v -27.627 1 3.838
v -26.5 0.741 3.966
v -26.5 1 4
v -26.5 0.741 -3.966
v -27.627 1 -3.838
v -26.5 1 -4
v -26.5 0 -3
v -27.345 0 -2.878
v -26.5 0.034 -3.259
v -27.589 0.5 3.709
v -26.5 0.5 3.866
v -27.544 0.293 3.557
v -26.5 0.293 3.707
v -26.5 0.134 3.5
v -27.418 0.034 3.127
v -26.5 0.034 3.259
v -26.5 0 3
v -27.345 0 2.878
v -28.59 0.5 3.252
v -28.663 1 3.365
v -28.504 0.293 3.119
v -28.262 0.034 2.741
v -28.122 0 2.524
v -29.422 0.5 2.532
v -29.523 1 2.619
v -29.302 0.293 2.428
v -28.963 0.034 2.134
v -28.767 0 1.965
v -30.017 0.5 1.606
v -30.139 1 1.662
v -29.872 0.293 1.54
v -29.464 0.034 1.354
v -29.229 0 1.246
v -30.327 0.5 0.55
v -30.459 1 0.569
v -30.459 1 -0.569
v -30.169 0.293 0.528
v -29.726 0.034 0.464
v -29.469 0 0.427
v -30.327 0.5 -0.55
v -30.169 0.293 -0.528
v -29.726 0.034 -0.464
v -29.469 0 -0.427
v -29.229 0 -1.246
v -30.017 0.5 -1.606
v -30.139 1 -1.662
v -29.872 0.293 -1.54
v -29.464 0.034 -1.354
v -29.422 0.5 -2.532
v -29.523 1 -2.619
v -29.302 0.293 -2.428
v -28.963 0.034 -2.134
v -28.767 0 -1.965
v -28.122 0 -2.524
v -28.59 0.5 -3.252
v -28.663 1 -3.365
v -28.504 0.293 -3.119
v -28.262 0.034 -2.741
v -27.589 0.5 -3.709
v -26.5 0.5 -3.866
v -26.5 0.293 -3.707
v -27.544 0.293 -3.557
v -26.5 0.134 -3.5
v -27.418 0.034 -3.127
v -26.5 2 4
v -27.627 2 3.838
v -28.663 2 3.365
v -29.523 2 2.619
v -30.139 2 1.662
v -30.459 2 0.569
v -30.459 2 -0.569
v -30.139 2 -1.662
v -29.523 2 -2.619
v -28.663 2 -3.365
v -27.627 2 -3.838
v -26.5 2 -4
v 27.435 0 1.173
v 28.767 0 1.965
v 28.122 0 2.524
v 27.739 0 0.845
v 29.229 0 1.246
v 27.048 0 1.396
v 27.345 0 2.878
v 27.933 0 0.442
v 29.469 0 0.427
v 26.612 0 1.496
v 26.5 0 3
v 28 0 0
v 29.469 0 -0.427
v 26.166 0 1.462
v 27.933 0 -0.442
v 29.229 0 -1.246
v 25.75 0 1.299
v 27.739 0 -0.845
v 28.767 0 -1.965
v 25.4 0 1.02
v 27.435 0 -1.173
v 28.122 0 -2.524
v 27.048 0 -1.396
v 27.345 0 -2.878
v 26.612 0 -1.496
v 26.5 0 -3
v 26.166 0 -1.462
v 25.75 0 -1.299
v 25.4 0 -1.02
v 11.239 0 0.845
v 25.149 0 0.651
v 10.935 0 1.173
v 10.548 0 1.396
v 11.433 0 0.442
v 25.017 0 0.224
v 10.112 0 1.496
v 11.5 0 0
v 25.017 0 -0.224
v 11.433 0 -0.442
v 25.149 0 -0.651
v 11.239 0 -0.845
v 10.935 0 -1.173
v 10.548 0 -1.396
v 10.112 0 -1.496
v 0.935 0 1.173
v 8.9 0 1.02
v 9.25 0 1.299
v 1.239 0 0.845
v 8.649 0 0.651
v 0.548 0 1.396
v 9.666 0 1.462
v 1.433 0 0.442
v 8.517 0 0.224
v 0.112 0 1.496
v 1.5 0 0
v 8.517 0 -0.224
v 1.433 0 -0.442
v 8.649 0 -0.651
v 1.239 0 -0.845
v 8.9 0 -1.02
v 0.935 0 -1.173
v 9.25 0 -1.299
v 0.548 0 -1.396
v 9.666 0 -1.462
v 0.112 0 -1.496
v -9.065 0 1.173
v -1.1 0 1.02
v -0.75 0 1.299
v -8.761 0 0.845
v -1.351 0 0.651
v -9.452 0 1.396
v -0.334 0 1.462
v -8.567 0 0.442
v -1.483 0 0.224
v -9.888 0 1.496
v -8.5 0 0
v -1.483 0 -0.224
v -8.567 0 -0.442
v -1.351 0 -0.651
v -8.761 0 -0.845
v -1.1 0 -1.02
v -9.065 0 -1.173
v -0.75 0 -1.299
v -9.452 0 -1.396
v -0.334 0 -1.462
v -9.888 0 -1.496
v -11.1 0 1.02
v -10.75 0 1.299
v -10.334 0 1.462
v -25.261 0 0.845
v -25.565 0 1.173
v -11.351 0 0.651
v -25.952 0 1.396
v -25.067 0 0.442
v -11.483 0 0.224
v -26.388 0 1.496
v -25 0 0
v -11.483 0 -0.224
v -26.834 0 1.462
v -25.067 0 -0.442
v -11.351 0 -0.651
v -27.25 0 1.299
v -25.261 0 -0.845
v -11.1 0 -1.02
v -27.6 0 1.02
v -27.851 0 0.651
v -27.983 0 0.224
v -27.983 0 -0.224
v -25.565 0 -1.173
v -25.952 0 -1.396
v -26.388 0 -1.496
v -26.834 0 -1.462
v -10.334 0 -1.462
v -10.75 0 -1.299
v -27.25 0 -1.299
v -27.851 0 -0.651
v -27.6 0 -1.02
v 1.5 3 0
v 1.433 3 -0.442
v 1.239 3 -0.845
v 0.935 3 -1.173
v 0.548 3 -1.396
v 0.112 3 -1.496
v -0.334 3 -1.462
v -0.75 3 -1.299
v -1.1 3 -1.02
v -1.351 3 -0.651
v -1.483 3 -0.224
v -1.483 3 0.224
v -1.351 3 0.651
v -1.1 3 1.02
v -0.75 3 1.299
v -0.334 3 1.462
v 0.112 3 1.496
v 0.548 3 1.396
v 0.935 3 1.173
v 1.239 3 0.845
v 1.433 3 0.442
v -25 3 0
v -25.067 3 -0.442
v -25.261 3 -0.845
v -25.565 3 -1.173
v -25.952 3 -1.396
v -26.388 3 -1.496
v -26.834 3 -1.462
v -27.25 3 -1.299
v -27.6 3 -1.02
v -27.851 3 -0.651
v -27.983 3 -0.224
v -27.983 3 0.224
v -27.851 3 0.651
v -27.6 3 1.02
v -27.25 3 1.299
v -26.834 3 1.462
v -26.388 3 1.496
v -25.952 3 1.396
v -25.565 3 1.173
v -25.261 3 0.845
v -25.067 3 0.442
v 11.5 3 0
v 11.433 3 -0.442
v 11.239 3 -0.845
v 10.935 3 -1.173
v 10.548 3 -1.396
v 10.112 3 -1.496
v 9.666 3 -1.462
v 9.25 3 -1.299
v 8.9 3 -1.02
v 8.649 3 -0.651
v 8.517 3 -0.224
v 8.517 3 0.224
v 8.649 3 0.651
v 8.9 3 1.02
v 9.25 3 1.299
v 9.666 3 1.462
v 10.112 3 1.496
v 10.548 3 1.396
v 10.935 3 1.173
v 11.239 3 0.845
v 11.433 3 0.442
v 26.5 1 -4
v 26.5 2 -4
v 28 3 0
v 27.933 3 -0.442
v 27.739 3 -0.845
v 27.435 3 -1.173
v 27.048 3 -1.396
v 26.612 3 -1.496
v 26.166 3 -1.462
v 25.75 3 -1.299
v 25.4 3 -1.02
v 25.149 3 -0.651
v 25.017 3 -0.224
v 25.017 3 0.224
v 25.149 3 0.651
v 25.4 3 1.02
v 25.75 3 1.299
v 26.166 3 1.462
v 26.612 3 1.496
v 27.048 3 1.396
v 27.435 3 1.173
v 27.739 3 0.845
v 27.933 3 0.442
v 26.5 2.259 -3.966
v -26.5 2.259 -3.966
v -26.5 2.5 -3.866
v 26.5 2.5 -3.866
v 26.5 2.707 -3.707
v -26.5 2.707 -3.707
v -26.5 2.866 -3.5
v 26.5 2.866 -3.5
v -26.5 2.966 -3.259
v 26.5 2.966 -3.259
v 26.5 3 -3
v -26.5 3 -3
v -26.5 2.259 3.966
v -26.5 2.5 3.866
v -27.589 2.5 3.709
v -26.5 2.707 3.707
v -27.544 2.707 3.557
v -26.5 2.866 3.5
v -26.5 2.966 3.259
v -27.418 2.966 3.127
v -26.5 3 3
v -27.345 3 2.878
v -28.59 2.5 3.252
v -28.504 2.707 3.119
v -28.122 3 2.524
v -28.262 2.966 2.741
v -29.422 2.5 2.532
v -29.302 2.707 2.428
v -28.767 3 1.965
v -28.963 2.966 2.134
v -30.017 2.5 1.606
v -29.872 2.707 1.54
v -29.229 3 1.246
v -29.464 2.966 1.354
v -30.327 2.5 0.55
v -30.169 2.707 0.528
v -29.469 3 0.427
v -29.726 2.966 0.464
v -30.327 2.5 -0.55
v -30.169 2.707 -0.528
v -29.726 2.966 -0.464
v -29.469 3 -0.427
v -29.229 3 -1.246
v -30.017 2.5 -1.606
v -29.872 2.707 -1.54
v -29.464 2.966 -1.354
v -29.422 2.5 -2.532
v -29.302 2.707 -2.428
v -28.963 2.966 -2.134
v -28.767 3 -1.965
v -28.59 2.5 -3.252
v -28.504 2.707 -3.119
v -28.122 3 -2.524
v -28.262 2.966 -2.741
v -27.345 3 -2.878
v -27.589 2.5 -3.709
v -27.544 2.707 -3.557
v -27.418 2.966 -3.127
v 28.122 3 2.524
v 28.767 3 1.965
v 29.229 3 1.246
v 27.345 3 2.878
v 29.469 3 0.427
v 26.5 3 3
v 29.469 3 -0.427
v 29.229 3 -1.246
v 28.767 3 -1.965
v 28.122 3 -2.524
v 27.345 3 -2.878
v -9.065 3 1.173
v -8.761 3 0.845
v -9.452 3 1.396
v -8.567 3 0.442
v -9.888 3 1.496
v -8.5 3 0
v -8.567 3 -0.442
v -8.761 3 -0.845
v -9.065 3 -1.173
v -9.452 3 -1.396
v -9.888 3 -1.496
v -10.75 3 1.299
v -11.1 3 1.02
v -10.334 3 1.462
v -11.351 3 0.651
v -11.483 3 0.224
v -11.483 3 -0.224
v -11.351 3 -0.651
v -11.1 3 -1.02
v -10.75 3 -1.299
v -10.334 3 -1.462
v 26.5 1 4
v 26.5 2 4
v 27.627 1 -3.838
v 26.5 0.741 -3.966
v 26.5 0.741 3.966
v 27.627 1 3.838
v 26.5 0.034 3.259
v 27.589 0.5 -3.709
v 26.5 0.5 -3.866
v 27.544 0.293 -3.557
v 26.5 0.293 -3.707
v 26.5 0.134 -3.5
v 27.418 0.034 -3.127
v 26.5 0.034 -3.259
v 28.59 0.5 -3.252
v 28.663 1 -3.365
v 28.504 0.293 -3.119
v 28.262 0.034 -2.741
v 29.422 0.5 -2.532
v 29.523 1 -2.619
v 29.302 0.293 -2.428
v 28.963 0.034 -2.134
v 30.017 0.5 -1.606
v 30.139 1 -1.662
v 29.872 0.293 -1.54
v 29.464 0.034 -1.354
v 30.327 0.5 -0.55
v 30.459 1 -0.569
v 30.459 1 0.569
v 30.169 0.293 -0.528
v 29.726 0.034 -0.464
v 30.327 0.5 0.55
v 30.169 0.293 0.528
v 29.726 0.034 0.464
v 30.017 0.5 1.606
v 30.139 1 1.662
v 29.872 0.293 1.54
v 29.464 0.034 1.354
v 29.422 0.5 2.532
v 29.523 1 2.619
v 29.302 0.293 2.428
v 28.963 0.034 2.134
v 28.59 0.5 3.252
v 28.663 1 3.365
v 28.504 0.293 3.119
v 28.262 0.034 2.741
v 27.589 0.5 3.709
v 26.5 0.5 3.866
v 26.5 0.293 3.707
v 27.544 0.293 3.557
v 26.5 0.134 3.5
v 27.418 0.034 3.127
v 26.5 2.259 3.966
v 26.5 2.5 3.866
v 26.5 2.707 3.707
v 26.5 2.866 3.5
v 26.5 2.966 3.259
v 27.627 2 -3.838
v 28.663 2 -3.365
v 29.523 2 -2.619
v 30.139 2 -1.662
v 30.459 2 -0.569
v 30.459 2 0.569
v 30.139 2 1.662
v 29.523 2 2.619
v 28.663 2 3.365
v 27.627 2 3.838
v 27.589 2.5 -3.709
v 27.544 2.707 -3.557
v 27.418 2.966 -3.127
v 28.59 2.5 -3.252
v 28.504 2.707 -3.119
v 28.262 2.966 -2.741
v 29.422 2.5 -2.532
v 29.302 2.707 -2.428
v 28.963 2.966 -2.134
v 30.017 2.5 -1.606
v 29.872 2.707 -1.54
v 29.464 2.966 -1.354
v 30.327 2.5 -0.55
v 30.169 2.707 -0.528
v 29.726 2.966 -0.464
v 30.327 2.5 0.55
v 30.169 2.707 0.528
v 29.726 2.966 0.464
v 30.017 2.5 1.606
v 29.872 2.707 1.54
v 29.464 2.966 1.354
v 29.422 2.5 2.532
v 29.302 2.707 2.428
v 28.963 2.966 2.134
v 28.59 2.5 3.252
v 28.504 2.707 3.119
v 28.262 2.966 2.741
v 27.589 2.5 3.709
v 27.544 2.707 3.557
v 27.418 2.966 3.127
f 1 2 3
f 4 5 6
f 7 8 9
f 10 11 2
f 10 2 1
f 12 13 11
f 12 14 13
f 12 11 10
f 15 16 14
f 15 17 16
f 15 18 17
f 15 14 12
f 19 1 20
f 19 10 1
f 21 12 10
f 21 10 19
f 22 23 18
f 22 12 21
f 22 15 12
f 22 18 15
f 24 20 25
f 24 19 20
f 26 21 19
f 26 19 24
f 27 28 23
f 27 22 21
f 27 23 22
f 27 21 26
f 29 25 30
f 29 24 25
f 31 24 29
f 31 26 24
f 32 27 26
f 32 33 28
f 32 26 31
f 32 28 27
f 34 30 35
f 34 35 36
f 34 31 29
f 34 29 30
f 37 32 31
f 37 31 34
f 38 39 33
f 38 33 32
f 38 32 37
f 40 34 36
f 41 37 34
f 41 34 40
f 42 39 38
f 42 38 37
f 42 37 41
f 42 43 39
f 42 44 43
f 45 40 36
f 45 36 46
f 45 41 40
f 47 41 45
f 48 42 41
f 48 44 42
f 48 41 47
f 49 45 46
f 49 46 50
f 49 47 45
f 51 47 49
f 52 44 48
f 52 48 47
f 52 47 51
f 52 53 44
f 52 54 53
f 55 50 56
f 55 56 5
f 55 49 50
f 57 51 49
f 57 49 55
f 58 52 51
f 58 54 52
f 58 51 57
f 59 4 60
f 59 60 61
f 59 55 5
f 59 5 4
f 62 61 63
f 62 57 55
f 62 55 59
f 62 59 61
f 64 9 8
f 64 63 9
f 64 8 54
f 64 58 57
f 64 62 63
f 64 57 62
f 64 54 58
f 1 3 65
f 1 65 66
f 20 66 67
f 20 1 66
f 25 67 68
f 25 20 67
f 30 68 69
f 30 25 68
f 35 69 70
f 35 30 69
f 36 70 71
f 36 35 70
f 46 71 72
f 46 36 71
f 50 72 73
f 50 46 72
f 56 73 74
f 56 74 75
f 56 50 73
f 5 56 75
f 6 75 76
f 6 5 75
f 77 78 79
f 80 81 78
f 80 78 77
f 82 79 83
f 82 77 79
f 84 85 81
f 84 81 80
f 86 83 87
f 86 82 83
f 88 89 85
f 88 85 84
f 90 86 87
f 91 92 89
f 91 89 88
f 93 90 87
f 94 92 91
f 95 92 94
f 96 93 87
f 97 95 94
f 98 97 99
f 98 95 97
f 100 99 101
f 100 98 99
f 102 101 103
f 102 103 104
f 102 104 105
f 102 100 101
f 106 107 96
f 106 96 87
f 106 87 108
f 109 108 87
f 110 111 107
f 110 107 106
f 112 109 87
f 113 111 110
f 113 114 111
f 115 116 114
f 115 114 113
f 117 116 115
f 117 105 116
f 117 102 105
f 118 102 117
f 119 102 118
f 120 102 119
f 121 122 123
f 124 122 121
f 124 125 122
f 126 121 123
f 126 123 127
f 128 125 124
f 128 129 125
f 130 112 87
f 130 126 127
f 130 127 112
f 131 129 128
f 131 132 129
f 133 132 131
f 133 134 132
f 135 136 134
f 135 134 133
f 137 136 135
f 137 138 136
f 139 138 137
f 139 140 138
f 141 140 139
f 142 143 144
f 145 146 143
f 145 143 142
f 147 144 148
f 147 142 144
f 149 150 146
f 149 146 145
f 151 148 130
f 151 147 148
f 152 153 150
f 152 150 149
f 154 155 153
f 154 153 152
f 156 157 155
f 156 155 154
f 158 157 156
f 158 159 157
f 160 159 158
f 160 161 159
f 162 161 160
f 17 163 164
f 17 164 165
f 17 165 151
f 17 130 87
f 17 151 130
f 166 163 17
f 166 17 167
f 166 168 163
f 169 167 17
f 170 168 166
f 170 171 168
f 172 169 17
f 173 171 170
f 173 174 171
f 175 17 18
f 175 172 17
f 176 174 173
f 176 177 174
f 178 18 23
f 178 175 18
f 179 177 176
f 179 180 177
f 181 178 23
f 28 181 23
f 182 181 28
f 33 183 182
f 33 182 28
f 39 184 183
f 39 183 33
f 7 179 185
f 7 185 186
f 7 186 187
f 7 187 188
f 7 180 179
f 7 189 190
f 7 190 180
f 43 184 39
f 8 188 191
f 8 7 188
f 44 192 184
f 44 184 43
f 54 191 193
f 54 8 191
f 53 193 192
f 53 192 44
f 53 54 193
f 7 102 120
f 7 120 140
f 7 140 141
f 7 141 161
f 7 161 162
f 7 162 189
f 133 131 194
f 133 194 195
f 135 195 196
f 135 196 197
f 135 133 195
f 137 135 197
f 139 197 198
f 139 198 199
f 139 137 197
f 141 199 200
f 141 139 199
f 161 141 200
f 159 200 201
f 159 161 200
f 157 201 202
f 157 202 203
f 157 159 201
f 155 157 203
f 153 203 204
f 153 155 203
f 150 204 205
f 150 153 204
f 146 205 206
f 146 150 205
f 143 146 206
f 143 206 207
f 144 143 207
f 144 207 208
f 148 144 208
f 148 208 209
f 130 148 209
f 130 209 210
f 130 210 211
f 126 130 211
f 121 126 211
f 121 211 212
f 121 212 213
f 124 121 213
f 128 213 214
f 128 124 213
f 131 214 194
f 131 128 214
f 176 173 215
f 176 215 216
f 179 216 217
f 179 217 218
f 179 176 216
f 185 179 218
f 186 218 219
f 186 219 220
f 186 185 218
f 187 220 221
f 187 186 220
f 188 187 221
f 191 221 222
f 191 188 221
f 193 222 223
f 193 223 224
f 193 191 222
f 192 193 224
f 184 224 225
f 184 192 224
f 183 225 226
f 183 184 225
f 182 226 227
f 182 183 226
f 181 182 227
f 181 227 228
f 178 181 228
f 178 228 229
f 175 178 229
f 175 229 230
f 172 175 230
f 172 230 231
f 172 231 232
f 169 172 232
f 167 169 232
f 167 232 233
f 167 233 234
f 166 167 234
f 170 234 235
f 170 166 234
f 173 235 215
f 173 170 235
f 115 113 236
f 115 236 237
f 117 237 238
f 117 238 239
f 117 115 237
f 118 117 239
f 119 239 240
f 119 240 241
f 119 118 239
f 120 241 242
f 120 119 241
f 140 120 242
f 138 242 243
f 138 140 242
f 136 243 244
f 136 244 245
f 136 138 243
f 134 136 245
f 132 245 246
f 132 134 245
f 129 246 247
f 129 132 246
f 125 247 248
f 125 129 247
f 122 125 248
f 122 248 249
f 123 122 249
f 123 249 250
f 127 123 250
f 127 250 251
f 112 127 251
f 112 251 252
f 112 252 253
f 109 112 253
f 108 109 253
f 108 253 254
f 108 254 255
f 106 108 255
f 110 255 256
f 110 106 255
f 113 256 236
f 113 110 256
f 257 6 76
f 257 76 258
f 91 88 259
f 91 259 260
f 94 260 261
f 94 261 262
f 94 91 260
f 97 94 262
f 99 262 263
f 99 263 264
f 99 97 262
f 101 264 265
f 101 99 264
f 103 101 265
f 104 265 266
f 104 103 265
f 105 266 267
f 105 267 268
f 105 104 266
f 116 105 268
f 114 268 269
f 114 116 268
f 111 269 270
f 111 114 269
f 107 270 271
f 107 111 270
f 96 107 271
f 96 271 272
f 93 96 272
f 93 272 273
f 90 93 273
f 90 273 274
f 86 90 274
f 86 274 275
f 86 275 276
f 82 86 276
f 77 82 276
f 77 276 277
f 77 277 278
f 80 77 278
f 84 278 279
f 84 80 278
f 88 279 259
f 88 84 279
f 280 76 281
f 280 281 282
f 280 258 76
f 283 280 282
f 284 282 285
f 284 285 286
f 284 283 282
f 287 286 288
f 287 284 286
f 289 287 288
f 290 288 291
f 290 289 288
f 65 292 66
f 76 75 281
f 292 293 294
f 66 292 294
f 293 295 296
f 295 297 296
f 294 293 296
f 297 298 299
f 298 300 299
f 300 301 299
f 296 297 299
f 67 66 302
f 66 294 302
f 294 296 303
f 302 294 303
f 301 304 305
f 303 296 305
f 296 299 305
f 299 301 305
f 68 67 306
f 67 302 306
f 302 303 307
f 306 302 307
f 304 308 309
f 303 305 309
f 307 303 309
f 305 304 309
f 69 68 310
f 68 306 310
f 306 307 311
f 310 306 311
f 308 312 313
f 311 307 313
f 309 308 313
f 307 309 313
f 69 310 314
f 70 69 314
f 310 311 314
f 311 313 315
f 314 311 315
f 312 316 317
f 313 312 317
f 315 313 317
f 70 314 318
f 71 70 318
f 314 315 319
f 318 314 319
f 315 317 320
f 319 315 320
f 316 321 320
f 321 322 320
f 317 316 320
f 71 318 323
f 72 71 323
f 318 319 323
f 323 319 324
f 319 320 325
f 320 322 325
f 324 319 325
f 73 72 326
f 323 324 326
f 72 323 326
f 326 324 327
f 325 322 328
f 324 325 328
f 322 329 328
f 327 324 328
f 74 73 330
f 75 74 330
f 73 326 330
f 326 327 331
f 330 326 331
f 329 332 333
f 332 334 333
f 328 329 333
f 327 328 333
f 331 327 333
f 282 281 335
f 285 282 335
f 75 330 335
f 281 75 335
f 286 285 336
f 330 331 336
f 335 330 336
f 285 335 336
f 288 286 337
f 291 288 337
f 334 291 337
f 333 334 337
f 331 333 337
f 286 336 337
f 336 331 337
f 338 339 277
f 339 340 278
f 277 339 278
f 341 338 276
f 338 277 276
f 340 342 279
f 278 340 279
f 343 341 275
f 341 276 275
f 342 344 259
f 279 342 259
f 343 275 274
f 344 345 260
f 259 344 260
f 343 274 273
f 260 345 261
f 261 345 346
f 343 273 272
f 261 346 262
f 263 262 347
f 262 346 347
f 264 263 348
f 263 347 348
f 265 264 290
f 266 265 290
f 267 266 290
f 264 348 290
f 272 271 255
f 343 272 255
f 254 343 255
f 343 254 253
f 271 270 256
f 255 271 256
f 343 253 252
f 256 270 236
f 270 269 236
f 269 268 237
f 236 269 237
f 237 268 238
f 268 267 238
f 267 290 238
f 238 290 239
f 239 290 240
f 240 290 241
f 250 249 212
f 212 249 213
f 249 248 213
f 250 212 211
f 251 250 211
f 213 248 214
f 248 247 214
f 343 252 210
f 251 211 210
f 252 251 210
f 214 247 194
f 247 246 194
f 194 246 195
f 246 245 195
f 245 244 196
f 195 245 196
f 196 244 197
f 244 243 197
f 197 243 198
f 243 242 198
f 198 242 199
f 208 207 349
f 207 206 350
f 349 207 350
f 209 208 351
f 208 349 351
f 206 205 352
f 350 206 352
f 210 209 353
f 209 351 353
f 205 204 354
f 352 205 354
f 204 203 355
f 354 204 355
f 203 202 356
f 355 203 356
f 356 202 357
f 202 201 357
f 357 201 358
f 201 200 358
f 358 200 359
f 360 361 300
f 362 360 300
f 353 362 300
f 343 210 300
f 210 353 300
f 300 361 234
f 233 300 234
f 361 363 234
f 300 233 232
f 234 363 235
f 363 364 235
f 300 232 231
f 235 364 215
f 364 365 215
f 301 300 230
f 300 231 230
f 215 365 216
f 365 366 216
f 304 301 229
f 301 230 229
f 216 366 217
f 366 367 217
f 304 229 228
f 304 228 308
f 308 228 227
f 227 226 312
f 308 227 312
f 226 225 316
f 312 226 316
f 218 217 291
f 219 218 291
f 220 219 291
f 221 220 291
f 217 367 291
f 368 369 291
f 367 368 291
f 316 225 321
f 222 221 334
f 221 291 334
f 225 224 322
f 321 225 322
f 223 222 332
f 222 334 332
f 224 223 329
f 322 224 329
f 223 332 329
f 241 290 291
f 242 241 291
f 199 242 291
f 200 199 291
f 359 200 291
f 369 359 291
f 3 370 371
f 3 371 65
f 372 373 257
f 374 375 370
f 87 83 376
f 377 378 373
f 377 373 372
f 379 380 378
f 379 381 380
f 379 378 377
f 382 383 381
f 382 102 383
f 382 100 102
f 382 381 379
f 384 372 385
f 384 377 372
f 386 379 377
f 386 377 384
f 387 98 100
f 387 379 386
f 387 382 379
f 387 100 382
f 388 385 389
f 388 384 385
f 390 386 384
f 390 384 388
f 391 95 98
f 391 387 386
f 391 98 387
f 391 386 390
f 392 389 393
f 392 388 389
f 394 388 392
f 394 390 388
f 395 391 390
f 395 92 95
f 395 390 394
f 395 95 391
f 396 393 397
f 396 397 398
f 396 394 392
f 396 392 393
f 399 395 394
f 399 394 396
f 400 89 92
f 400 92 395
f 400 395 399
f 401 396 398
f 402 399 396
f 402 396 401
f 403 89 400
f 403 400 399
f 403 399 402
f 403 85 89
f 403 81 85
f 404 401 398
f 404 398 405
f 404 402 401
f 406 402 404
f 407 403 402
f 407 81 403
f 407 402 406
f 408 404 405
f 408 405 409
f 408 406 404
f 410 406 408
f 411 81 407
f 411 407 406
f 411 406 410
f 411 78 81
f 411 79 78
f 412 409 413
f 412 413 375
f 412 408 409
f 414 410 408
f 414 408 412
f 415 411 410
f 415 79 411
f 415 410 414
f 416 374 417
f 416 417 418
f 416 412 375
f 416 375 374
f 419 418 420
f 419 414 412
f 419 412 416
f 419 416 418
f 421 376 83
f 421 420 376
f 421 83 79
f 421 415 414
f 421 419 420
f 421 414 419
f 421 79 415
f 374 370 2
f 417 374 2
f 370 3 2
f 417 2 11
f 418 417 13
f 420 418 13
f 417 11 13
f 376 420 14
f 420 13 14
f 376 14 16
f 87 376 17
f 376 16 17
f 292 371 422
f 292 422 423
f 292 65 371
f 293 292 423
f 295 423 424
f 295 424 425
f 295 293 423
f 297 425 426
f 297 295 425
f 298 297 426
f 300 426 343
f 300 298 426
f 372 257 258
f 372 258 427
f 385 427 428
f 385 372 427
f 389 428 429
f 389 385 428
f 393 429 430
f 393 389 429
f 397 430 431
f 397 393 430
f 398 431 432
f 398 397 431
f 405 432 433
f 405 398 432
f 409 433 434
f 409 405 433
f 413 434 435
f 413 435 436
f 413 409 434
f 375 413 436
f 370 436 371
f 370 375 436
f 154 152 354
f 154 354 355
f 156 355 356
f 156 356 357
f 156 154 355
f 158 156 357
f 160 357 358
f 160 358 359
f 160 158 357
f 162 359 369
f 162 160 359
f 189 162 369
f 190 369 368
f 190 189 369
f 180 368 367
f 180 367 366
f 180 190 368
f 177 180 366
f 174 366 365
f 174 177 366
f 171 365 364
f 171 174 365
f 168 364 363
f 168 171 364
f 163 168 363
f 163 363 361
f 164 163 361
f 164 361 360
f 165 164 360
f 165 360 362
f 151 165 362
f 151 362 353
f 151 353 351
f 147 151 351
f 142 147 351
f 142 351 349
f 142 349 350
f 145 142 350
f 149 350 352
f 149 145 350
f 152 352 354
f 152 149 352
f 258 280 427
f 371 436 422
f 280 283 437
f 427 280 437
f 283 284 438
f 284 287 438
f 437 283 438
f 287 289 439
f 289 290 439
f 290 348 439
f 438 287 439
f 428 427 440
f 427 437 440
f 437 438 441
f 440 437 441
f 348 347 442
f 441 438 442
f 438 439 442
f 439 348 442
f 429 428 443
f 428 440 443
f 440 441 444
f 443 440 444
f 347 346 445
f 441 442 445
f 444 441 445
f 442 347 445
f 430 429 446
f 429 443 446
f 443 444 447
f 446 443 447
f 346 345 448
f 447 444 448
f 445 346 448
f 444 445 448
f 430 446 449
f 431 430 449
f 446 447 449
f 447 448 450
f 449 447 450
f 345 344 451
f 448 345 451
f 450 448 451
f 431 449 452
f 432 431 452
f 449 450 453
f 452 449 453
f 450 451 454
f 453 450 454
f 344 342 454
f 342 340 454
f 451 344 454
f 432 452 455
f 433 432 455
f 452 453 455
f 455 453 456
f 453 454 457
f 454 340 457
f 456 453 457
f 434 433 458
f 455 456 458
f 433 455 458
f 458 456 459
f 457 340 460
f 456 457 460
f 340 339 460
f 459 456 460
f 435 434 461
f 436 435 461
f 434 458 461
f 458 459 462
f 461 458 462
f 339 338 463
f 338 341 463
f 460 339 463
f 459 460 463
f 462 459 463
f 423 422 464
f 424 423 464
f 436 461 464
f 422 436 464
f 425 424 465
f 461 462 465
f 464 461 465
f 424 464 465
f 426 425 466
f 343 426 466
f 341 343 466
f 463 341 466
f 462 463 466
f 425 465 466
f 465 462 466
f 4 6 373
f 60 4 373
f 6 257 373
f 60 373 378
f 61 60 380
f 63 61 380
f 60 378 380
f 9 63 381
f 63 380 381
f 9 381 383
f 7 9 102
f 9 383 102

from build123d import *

# Parameters (mm, degrees)
SKETCH1_R           = 1.5
BOSS_EXTRUDE1_DEPTH = 3
FILLET1_R           = 1


with BuildPart() as part:
    # Sketch1 → Boss-Extrude1 (new body)
    with BuildSketch(Plane(origin=(0, 0, 0), x_dir=(1, 0, 0), z_dir=(0, 1, 0))):
        with BuildLine():
            Line((-26.5, 4), (26.5, 4))
            ThreePointArc((26.5, 4), (30.5, 0), (26.5, -4))
            Line((26.5, -4), (-26.5, -4))
            ThreePointArc((-26.5, -4), (-30.5, 0), (-26.5, 4))
        make_face()
        with Locations((-26.5, 0)):
            Circle(SKETCH1_R, mode=Mode.SUBTRACT)
        with Locations((26.5, 0)):
            Circle(SKETCH1_R, mode=Mode.SUBTRACT)
        with Locations((-10, 0)):
            Circle(SKETCH1_R, mode=Mode.SUBTRACT)
        with Locations((10, 0)):
            Circle(SKETCH1_R, mode=Mode.SUBTRACT)
        Circle(SKETCH1_R, mode=Mode.SUBTRACT)
    extrude(amount=BOSS_EXTRUDE1_DEPTH)

    # Fillet1
    fillet1_edges = [part.edges().sort_by_distance(p)[0] for p in [
        (30.5, 0, 0),
        (0, 0, 4),
        (-30.5, 0, 0),
        (0, 0, -4),
        (0, 3, -4),
        (-30.5, 3, 0),
        (0, 3, 4),
        (30.5, 3, 0),
    ]]
    fillet(fillet1_edges, radius=FILLET1_R)


solid = part.part
